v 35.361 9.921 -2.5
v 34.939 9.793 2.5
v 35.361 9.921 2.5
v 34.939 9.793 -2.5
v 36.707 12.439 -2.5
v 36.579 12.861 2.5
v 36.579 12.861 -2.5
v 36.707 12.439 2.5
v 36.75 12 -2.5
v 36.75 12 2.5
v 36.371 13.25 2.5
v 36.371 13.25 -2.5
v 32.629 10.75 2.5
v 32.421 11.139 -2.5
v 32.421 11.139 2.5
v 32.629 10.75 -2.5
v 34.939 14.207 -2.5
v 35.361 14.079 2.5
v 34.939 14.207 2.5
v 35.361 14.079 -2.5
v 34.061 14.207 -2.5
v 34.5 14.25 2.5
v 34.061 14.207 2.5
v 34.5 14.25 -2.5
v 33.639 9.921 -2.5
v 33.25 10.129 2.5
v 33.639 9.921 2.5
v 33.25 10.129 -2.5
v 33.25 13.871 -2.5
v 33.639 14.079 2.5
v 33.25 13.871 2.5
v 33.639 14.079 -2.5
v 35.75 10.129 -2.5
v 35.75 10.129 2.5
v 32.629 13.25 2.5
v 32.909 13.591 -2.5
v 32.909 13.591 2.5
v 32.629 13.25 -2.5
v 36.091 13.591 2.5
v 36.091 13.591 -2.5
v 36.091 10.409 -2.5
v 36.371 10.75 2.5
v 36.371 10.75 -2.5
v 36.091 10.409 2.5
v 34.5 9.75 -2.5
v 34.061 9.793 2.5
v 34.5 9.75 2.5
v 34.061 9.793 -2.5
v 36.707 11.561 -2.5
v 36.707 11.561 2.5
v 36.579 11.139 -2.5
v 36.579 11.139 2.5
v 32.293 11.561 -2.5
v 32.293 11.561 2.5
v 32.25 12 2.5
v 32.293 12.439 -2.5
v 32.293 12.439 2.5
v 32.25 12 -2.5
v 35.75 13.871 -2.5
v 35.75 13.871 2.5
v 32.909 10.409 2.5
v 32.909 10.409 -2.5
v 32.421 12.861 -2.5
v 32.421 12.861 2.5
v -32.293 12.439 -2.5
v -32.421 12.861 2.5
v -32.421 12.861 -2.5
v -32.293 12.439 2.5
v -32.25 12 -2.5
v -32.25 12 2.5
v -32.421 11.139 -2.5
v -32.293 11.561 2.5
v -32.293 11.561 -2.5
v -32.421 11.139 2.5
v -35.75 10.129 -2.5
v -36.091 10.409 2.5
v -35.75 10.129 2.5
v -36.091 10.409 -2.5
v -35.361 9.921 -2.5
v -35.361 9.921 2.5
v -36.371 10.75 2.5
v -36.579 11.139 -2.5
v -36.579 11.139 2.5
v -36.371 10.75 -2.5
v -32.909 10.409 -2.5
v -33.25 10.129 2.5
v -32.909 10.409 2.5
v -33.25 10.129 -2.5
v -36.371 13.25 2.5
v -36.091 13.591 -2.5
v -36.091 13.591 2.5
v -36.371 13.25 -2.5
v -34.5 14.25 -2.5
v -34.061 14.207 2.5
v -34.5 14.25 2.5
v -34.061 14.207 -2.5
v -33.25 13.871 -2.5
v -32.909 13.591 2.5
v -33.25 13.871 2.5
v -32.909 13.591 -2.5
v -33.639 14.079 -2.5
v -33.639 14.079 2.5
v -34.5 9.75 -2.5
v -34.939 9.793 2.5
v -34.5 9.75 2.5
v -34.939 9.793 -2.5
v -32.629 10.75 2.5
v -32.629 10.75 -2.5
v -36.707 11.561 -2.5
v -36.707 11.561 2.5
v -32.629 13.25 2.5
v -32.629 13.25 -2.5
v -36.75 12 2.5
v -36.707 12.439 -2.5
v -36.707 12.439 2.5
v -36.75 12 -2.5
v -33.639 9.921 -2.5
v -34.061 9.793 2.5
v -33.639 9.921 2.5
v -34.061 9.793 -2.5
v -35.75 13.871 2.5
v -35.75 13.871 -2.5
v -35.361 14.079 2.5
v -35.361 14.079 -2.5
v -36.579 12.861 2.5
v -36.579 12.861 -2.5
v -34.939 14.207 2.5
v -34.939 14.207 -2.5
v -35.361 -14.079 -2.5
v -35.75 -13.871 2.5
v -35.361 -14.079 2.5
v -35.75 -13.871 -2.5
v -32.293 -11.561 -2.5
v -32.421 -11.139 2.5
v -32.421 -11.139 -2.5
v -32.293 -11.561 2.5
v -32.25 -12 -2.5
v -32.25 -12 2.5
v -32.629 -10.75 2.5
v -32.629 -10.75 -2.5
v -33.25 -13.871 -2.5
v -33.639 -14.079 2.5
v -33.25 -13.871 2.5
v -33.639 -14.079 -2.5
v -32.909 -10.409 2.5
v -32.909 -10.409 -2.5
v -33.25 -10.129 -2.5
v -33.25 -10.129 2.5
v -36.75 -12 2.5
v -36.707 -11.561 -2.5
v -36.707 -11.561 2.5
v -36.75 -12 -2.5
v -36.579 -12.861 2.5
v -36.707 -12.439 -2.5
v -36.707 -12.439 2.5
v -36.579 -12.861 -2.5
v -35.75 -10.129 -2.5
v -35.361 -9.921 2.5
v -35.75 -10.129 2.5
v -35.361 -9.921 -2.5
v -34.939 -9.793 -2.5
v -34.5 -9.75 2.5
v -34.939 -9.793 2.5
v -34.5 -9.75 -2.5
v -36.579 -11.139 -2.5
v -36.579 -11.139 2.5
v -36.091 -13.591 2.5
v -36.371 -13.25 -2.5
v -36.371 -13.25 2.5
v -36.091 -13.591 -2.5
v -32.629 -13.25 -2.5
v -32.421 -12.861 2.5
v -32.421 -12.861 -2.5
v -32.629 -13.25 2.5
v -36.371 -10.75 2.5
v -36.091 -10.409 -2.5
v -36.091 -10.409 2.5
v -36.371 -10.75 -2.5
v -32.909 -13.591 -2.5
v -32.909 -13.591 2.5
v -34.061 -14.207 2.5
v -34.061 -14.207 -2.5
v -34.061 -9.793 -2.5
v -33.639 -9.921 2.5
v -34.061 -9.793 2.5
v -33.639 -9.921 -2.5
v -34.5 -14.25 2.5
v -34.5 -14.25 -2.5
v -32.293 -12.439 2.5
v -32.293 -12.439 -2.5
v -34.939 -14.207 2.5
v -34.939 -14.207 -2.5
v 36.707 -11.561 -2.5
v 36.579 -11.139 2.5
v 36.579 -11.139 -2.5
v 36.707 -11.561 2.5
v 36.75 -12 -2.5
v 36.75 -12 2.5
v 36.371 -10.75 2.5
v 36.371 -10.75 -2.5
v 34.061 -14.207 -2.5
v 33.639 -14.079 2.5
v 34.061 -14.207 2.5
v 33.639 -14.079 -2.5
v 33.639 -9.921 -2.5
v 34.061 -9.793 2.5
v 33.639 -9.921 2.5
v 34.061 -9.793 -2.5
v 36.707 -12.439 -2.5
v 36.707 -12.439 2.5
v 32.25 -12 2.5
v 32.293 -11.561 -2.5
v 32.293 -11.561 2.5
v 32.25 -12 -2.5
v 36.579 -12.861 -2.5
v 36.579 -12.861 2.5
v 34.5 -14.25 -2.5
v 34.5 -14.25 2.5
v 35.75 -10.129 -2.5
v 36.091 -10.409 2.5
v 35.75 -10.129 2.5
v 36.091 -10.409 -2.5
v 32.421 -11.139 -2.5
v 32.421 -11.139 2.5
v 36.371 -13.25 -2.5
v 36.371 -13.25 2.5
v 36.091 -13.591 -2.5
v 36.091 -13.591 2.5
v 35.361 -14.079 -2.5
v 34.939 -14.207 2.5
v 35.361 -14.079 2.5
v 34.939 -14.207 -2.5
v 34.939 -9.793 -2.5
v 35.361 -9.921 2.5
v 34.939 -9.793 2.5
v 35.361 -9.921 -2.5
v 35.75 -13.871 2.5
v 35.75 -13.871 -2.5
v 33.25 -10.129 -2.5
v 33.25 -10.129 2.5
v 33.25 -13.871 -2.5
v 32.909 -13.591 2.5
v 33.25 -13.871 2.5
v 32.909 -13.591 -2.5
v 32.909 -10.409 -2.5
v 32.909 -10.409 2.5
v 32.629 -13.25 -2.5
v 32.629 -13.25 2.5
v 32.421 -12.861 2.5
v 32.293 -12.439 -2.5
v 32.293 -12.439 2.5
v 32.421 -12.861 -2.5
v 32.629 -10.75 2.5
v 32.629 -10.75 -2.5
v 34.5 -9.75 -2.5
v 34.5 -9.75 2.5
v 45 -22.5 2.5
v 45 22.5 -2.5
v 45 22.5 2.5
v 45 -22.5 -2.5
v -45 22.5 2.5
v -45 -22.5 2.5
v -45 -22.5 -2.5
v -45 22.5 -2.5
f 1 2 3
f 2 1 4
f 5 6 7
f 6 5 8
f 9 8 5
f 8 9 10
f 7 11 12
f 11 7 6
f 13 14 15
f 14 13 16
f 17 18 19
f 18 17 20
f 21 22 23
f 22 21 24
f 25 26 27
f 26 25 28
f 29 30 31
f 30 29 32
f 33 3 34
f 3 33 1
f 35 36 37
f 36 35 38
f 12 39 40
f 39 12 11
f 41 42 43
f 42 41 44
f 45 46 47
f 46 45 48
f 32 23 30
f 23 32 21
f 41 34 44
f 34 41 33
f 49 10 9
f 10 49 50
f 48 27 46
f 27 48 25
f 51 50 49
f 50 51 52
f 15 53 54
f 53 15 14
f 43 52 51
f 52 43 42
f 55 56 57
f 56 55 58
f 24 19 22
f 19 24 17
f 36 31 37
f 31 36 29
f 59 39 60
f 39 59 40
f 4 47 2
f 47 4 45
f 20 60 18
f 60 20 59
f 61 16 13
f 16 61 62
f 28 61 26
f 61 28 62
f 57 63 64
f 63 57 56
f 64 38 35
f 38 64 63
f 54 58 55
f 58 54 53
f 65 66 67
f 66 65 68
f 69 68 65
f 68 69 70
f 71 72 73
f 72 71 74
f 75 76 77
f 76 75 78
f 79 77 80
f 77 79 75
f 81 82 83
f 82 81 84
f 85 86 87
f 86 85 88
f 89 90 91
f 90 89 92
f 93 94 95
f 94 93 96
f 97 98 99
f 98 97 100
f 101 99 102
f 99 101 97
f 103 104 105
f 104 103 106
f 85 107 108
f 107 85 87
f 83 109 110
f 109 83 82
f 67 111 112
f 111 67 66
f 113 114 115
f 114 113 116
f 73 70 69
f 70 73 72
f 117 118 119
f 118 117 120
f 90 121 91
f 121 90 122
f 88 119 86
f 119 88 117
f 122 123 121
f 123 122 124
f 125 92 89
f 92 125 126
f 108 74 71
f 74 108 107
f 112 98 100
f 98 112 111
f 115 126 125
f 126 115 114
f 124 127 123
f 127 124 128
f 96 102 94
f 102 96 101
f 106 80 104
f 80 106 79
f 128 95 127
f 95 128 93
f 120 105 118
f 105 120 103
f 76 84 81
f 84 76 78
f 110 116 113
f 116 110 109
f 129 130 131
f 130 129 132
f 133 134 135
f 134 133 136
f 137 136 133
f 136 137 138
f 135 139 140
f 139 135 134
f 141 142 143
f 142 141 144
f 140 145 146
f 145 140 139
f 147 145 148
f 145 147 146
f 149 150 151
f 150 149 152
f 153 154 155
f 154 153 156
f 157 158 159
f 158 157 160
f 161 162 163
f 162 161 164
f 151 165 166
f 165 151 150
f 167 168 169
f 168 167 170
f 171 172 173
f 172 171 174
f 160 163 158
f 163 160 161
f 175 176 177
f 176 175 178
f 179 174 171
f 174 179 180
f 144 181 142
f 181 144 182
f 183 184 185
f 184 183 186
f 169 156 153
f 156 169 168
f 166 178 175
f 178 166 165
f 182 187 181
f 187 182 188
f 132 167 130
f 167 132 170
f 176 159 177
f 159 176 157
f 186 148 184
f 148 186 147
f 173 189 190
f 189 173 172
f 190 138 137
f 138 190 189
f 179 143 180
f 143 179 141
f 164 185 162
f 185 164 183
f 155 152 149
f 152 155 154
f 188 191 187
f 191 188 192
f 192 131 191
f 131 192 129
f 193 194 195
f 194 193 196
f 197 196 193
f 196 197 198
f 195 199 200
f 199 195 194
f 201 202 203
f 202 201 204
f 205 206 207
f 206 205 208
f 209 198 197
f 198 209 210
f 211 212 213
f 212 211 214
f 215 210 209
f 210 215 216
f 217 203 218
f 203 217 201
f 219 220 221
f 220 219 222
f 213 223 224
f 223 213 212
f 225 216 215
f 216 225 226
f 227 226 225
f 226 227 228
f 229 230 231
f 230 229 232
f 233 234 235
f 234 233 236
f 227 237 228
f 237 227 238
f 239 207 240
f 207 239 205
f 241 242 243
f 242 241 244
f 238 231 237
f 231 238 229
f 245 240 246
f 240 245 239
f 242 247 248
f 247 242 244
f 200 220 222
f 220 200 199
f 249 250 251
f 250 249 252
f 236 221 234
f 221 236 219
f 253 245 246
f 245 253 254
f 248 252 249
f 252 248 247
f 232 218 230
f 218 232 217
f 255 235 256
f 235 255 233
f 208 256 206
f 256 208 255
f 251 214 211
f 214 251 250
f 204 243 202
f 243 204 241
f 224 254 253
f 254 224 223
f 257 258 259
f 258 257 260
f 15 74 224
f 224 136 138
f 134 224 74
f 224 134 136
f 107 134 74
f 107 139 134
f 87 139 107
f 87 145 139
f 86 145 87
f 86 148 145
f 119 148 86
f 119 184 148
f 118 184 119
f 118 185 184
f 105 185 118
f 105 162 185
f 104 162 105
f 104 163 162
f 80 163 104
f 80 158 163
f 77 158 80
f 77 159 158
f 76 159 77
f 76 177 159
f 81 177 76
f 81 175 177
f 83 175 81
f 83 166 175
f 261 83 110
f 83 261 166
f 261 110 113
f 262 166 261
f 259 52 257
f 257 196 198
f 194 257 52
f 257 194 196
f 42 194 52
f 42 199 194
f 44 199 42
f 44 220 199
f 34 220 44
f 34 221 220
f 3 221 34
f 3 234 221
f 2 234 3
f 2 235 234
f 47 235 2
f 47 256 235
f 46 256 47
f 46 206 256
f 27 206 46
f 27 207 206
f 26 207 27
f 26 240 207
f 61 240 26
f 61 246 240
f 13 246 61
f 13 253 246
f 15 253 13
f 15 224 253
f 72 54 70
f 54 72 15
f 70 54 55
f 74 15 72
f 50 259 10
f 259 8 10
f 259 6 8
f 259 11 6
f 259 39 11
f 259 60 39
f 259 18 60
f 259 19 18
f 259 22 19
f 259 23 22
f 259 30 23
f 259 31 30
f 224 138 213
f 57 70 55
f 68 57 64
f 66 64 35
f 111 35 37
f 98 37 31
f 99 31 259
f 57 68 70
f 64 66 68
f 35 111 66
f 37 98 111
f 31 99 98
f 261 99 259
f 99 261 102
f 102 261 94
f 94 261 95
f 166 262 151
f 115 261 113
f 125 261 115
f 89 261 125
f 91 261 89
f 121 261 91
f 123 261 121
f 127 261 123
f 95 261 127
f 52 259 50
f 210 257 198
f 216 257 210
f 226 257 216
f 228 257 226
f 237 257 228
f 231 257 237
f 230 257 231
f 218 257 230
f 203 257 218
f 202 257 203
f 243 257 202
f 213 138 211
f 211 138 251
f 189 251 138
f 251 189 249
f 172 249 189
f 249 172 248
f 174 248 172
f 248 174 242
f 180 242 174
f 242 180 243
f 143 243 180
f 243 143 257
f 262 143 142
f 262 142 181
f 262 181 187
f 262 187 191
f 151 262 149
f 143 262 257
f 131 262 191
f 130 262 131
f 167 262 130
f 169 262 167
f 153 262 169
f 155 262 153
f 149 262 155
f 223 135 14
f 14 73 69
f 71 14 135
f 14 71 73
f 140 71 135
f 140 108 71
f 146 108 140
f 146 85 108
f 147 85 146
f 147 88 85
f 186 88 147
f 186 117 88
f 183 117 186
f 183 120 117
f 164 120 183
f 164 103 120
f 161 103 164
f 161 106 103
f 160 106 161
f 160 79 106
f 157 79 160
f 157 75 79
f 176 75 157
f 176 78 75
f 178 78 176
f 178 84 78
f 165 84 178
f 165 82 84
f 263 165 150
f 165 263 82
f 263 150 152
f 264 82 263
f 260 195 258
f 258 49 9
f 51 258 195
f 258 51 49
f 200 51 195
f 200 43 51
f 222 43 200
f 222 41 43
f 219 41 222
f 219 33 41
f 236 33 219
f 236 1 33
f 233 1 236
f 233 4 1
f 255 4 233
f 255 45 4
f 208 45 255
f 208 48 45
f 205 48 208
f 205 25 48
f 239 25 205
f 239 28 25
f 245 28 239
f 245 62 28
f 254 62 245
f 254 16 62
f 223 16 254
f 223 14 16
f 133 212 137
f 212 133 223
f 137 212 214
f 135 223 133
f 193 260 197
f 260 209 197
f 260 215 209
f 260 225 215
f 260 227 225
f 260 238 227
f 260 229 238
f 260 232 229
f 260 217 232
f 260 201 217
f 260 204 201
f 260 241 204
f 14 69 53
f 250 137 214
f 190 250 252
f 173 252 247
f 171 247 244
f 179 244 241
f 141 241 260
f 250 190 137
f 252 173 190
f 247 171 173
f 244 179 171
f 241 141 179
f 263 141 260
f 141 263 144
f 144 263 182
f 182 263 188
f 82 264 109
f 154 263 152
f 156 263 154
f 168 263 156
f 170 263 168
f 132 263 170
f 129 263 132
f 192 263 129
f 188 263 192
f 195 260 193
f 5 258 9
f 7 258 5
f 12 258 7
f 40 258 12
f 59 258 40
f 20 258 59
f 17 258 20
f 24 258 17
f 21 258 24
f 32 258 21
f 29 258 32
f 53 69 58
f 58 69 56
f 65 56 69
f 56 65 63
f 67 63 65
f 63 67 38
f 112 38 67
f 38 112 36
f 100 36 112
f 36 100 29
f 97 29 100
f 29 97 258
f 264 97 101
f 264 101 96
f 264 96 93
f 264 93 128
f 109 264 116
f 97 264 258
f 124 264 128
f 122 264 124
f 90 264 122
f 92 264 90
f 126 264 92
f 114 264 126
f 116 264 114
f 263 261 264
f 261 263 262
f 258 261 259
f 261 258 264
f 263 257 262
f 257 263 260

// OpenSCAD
$fn = 32;

// ----------------------------------------------------------------------
// Corner plate 90 x 45 x 5
// 4 holes, centres taken from the edge offset
// ----------------------------------------------------------------------

// --- parameters (mm) ---
plate = [90, 45, 5];  // overall size (x, y, z)
holes = 4;            // number of holes the drawing asks for
hole_d = 4.5;         // hole diameter
edge = 10.5;          // hole centre offset from the plate edge

// --- derived feature positions (mm) ---
corner_x = plate[0] / 2 - edge;  // = 34.5   corner hole X
corner_y = plate[1] / 2 - edge;  // = 12   corner hole Y
feature_centers = [
  [corner_x, corner_y],
  [-corner_x, corner_y],
  [-corner_x, -corner_y],
  [corner_x, -corner_y]
];   // hole centres the loop below drills

// plate outline, every hole drilled through with the same cutters
difference() {
  cube(plate, center = true);
  for (centre = feature_centers)
    translate([centre[0], centre[1], 0])
      cylinder(d = hole_d, h = plate[2] + 2, center = true);
}
